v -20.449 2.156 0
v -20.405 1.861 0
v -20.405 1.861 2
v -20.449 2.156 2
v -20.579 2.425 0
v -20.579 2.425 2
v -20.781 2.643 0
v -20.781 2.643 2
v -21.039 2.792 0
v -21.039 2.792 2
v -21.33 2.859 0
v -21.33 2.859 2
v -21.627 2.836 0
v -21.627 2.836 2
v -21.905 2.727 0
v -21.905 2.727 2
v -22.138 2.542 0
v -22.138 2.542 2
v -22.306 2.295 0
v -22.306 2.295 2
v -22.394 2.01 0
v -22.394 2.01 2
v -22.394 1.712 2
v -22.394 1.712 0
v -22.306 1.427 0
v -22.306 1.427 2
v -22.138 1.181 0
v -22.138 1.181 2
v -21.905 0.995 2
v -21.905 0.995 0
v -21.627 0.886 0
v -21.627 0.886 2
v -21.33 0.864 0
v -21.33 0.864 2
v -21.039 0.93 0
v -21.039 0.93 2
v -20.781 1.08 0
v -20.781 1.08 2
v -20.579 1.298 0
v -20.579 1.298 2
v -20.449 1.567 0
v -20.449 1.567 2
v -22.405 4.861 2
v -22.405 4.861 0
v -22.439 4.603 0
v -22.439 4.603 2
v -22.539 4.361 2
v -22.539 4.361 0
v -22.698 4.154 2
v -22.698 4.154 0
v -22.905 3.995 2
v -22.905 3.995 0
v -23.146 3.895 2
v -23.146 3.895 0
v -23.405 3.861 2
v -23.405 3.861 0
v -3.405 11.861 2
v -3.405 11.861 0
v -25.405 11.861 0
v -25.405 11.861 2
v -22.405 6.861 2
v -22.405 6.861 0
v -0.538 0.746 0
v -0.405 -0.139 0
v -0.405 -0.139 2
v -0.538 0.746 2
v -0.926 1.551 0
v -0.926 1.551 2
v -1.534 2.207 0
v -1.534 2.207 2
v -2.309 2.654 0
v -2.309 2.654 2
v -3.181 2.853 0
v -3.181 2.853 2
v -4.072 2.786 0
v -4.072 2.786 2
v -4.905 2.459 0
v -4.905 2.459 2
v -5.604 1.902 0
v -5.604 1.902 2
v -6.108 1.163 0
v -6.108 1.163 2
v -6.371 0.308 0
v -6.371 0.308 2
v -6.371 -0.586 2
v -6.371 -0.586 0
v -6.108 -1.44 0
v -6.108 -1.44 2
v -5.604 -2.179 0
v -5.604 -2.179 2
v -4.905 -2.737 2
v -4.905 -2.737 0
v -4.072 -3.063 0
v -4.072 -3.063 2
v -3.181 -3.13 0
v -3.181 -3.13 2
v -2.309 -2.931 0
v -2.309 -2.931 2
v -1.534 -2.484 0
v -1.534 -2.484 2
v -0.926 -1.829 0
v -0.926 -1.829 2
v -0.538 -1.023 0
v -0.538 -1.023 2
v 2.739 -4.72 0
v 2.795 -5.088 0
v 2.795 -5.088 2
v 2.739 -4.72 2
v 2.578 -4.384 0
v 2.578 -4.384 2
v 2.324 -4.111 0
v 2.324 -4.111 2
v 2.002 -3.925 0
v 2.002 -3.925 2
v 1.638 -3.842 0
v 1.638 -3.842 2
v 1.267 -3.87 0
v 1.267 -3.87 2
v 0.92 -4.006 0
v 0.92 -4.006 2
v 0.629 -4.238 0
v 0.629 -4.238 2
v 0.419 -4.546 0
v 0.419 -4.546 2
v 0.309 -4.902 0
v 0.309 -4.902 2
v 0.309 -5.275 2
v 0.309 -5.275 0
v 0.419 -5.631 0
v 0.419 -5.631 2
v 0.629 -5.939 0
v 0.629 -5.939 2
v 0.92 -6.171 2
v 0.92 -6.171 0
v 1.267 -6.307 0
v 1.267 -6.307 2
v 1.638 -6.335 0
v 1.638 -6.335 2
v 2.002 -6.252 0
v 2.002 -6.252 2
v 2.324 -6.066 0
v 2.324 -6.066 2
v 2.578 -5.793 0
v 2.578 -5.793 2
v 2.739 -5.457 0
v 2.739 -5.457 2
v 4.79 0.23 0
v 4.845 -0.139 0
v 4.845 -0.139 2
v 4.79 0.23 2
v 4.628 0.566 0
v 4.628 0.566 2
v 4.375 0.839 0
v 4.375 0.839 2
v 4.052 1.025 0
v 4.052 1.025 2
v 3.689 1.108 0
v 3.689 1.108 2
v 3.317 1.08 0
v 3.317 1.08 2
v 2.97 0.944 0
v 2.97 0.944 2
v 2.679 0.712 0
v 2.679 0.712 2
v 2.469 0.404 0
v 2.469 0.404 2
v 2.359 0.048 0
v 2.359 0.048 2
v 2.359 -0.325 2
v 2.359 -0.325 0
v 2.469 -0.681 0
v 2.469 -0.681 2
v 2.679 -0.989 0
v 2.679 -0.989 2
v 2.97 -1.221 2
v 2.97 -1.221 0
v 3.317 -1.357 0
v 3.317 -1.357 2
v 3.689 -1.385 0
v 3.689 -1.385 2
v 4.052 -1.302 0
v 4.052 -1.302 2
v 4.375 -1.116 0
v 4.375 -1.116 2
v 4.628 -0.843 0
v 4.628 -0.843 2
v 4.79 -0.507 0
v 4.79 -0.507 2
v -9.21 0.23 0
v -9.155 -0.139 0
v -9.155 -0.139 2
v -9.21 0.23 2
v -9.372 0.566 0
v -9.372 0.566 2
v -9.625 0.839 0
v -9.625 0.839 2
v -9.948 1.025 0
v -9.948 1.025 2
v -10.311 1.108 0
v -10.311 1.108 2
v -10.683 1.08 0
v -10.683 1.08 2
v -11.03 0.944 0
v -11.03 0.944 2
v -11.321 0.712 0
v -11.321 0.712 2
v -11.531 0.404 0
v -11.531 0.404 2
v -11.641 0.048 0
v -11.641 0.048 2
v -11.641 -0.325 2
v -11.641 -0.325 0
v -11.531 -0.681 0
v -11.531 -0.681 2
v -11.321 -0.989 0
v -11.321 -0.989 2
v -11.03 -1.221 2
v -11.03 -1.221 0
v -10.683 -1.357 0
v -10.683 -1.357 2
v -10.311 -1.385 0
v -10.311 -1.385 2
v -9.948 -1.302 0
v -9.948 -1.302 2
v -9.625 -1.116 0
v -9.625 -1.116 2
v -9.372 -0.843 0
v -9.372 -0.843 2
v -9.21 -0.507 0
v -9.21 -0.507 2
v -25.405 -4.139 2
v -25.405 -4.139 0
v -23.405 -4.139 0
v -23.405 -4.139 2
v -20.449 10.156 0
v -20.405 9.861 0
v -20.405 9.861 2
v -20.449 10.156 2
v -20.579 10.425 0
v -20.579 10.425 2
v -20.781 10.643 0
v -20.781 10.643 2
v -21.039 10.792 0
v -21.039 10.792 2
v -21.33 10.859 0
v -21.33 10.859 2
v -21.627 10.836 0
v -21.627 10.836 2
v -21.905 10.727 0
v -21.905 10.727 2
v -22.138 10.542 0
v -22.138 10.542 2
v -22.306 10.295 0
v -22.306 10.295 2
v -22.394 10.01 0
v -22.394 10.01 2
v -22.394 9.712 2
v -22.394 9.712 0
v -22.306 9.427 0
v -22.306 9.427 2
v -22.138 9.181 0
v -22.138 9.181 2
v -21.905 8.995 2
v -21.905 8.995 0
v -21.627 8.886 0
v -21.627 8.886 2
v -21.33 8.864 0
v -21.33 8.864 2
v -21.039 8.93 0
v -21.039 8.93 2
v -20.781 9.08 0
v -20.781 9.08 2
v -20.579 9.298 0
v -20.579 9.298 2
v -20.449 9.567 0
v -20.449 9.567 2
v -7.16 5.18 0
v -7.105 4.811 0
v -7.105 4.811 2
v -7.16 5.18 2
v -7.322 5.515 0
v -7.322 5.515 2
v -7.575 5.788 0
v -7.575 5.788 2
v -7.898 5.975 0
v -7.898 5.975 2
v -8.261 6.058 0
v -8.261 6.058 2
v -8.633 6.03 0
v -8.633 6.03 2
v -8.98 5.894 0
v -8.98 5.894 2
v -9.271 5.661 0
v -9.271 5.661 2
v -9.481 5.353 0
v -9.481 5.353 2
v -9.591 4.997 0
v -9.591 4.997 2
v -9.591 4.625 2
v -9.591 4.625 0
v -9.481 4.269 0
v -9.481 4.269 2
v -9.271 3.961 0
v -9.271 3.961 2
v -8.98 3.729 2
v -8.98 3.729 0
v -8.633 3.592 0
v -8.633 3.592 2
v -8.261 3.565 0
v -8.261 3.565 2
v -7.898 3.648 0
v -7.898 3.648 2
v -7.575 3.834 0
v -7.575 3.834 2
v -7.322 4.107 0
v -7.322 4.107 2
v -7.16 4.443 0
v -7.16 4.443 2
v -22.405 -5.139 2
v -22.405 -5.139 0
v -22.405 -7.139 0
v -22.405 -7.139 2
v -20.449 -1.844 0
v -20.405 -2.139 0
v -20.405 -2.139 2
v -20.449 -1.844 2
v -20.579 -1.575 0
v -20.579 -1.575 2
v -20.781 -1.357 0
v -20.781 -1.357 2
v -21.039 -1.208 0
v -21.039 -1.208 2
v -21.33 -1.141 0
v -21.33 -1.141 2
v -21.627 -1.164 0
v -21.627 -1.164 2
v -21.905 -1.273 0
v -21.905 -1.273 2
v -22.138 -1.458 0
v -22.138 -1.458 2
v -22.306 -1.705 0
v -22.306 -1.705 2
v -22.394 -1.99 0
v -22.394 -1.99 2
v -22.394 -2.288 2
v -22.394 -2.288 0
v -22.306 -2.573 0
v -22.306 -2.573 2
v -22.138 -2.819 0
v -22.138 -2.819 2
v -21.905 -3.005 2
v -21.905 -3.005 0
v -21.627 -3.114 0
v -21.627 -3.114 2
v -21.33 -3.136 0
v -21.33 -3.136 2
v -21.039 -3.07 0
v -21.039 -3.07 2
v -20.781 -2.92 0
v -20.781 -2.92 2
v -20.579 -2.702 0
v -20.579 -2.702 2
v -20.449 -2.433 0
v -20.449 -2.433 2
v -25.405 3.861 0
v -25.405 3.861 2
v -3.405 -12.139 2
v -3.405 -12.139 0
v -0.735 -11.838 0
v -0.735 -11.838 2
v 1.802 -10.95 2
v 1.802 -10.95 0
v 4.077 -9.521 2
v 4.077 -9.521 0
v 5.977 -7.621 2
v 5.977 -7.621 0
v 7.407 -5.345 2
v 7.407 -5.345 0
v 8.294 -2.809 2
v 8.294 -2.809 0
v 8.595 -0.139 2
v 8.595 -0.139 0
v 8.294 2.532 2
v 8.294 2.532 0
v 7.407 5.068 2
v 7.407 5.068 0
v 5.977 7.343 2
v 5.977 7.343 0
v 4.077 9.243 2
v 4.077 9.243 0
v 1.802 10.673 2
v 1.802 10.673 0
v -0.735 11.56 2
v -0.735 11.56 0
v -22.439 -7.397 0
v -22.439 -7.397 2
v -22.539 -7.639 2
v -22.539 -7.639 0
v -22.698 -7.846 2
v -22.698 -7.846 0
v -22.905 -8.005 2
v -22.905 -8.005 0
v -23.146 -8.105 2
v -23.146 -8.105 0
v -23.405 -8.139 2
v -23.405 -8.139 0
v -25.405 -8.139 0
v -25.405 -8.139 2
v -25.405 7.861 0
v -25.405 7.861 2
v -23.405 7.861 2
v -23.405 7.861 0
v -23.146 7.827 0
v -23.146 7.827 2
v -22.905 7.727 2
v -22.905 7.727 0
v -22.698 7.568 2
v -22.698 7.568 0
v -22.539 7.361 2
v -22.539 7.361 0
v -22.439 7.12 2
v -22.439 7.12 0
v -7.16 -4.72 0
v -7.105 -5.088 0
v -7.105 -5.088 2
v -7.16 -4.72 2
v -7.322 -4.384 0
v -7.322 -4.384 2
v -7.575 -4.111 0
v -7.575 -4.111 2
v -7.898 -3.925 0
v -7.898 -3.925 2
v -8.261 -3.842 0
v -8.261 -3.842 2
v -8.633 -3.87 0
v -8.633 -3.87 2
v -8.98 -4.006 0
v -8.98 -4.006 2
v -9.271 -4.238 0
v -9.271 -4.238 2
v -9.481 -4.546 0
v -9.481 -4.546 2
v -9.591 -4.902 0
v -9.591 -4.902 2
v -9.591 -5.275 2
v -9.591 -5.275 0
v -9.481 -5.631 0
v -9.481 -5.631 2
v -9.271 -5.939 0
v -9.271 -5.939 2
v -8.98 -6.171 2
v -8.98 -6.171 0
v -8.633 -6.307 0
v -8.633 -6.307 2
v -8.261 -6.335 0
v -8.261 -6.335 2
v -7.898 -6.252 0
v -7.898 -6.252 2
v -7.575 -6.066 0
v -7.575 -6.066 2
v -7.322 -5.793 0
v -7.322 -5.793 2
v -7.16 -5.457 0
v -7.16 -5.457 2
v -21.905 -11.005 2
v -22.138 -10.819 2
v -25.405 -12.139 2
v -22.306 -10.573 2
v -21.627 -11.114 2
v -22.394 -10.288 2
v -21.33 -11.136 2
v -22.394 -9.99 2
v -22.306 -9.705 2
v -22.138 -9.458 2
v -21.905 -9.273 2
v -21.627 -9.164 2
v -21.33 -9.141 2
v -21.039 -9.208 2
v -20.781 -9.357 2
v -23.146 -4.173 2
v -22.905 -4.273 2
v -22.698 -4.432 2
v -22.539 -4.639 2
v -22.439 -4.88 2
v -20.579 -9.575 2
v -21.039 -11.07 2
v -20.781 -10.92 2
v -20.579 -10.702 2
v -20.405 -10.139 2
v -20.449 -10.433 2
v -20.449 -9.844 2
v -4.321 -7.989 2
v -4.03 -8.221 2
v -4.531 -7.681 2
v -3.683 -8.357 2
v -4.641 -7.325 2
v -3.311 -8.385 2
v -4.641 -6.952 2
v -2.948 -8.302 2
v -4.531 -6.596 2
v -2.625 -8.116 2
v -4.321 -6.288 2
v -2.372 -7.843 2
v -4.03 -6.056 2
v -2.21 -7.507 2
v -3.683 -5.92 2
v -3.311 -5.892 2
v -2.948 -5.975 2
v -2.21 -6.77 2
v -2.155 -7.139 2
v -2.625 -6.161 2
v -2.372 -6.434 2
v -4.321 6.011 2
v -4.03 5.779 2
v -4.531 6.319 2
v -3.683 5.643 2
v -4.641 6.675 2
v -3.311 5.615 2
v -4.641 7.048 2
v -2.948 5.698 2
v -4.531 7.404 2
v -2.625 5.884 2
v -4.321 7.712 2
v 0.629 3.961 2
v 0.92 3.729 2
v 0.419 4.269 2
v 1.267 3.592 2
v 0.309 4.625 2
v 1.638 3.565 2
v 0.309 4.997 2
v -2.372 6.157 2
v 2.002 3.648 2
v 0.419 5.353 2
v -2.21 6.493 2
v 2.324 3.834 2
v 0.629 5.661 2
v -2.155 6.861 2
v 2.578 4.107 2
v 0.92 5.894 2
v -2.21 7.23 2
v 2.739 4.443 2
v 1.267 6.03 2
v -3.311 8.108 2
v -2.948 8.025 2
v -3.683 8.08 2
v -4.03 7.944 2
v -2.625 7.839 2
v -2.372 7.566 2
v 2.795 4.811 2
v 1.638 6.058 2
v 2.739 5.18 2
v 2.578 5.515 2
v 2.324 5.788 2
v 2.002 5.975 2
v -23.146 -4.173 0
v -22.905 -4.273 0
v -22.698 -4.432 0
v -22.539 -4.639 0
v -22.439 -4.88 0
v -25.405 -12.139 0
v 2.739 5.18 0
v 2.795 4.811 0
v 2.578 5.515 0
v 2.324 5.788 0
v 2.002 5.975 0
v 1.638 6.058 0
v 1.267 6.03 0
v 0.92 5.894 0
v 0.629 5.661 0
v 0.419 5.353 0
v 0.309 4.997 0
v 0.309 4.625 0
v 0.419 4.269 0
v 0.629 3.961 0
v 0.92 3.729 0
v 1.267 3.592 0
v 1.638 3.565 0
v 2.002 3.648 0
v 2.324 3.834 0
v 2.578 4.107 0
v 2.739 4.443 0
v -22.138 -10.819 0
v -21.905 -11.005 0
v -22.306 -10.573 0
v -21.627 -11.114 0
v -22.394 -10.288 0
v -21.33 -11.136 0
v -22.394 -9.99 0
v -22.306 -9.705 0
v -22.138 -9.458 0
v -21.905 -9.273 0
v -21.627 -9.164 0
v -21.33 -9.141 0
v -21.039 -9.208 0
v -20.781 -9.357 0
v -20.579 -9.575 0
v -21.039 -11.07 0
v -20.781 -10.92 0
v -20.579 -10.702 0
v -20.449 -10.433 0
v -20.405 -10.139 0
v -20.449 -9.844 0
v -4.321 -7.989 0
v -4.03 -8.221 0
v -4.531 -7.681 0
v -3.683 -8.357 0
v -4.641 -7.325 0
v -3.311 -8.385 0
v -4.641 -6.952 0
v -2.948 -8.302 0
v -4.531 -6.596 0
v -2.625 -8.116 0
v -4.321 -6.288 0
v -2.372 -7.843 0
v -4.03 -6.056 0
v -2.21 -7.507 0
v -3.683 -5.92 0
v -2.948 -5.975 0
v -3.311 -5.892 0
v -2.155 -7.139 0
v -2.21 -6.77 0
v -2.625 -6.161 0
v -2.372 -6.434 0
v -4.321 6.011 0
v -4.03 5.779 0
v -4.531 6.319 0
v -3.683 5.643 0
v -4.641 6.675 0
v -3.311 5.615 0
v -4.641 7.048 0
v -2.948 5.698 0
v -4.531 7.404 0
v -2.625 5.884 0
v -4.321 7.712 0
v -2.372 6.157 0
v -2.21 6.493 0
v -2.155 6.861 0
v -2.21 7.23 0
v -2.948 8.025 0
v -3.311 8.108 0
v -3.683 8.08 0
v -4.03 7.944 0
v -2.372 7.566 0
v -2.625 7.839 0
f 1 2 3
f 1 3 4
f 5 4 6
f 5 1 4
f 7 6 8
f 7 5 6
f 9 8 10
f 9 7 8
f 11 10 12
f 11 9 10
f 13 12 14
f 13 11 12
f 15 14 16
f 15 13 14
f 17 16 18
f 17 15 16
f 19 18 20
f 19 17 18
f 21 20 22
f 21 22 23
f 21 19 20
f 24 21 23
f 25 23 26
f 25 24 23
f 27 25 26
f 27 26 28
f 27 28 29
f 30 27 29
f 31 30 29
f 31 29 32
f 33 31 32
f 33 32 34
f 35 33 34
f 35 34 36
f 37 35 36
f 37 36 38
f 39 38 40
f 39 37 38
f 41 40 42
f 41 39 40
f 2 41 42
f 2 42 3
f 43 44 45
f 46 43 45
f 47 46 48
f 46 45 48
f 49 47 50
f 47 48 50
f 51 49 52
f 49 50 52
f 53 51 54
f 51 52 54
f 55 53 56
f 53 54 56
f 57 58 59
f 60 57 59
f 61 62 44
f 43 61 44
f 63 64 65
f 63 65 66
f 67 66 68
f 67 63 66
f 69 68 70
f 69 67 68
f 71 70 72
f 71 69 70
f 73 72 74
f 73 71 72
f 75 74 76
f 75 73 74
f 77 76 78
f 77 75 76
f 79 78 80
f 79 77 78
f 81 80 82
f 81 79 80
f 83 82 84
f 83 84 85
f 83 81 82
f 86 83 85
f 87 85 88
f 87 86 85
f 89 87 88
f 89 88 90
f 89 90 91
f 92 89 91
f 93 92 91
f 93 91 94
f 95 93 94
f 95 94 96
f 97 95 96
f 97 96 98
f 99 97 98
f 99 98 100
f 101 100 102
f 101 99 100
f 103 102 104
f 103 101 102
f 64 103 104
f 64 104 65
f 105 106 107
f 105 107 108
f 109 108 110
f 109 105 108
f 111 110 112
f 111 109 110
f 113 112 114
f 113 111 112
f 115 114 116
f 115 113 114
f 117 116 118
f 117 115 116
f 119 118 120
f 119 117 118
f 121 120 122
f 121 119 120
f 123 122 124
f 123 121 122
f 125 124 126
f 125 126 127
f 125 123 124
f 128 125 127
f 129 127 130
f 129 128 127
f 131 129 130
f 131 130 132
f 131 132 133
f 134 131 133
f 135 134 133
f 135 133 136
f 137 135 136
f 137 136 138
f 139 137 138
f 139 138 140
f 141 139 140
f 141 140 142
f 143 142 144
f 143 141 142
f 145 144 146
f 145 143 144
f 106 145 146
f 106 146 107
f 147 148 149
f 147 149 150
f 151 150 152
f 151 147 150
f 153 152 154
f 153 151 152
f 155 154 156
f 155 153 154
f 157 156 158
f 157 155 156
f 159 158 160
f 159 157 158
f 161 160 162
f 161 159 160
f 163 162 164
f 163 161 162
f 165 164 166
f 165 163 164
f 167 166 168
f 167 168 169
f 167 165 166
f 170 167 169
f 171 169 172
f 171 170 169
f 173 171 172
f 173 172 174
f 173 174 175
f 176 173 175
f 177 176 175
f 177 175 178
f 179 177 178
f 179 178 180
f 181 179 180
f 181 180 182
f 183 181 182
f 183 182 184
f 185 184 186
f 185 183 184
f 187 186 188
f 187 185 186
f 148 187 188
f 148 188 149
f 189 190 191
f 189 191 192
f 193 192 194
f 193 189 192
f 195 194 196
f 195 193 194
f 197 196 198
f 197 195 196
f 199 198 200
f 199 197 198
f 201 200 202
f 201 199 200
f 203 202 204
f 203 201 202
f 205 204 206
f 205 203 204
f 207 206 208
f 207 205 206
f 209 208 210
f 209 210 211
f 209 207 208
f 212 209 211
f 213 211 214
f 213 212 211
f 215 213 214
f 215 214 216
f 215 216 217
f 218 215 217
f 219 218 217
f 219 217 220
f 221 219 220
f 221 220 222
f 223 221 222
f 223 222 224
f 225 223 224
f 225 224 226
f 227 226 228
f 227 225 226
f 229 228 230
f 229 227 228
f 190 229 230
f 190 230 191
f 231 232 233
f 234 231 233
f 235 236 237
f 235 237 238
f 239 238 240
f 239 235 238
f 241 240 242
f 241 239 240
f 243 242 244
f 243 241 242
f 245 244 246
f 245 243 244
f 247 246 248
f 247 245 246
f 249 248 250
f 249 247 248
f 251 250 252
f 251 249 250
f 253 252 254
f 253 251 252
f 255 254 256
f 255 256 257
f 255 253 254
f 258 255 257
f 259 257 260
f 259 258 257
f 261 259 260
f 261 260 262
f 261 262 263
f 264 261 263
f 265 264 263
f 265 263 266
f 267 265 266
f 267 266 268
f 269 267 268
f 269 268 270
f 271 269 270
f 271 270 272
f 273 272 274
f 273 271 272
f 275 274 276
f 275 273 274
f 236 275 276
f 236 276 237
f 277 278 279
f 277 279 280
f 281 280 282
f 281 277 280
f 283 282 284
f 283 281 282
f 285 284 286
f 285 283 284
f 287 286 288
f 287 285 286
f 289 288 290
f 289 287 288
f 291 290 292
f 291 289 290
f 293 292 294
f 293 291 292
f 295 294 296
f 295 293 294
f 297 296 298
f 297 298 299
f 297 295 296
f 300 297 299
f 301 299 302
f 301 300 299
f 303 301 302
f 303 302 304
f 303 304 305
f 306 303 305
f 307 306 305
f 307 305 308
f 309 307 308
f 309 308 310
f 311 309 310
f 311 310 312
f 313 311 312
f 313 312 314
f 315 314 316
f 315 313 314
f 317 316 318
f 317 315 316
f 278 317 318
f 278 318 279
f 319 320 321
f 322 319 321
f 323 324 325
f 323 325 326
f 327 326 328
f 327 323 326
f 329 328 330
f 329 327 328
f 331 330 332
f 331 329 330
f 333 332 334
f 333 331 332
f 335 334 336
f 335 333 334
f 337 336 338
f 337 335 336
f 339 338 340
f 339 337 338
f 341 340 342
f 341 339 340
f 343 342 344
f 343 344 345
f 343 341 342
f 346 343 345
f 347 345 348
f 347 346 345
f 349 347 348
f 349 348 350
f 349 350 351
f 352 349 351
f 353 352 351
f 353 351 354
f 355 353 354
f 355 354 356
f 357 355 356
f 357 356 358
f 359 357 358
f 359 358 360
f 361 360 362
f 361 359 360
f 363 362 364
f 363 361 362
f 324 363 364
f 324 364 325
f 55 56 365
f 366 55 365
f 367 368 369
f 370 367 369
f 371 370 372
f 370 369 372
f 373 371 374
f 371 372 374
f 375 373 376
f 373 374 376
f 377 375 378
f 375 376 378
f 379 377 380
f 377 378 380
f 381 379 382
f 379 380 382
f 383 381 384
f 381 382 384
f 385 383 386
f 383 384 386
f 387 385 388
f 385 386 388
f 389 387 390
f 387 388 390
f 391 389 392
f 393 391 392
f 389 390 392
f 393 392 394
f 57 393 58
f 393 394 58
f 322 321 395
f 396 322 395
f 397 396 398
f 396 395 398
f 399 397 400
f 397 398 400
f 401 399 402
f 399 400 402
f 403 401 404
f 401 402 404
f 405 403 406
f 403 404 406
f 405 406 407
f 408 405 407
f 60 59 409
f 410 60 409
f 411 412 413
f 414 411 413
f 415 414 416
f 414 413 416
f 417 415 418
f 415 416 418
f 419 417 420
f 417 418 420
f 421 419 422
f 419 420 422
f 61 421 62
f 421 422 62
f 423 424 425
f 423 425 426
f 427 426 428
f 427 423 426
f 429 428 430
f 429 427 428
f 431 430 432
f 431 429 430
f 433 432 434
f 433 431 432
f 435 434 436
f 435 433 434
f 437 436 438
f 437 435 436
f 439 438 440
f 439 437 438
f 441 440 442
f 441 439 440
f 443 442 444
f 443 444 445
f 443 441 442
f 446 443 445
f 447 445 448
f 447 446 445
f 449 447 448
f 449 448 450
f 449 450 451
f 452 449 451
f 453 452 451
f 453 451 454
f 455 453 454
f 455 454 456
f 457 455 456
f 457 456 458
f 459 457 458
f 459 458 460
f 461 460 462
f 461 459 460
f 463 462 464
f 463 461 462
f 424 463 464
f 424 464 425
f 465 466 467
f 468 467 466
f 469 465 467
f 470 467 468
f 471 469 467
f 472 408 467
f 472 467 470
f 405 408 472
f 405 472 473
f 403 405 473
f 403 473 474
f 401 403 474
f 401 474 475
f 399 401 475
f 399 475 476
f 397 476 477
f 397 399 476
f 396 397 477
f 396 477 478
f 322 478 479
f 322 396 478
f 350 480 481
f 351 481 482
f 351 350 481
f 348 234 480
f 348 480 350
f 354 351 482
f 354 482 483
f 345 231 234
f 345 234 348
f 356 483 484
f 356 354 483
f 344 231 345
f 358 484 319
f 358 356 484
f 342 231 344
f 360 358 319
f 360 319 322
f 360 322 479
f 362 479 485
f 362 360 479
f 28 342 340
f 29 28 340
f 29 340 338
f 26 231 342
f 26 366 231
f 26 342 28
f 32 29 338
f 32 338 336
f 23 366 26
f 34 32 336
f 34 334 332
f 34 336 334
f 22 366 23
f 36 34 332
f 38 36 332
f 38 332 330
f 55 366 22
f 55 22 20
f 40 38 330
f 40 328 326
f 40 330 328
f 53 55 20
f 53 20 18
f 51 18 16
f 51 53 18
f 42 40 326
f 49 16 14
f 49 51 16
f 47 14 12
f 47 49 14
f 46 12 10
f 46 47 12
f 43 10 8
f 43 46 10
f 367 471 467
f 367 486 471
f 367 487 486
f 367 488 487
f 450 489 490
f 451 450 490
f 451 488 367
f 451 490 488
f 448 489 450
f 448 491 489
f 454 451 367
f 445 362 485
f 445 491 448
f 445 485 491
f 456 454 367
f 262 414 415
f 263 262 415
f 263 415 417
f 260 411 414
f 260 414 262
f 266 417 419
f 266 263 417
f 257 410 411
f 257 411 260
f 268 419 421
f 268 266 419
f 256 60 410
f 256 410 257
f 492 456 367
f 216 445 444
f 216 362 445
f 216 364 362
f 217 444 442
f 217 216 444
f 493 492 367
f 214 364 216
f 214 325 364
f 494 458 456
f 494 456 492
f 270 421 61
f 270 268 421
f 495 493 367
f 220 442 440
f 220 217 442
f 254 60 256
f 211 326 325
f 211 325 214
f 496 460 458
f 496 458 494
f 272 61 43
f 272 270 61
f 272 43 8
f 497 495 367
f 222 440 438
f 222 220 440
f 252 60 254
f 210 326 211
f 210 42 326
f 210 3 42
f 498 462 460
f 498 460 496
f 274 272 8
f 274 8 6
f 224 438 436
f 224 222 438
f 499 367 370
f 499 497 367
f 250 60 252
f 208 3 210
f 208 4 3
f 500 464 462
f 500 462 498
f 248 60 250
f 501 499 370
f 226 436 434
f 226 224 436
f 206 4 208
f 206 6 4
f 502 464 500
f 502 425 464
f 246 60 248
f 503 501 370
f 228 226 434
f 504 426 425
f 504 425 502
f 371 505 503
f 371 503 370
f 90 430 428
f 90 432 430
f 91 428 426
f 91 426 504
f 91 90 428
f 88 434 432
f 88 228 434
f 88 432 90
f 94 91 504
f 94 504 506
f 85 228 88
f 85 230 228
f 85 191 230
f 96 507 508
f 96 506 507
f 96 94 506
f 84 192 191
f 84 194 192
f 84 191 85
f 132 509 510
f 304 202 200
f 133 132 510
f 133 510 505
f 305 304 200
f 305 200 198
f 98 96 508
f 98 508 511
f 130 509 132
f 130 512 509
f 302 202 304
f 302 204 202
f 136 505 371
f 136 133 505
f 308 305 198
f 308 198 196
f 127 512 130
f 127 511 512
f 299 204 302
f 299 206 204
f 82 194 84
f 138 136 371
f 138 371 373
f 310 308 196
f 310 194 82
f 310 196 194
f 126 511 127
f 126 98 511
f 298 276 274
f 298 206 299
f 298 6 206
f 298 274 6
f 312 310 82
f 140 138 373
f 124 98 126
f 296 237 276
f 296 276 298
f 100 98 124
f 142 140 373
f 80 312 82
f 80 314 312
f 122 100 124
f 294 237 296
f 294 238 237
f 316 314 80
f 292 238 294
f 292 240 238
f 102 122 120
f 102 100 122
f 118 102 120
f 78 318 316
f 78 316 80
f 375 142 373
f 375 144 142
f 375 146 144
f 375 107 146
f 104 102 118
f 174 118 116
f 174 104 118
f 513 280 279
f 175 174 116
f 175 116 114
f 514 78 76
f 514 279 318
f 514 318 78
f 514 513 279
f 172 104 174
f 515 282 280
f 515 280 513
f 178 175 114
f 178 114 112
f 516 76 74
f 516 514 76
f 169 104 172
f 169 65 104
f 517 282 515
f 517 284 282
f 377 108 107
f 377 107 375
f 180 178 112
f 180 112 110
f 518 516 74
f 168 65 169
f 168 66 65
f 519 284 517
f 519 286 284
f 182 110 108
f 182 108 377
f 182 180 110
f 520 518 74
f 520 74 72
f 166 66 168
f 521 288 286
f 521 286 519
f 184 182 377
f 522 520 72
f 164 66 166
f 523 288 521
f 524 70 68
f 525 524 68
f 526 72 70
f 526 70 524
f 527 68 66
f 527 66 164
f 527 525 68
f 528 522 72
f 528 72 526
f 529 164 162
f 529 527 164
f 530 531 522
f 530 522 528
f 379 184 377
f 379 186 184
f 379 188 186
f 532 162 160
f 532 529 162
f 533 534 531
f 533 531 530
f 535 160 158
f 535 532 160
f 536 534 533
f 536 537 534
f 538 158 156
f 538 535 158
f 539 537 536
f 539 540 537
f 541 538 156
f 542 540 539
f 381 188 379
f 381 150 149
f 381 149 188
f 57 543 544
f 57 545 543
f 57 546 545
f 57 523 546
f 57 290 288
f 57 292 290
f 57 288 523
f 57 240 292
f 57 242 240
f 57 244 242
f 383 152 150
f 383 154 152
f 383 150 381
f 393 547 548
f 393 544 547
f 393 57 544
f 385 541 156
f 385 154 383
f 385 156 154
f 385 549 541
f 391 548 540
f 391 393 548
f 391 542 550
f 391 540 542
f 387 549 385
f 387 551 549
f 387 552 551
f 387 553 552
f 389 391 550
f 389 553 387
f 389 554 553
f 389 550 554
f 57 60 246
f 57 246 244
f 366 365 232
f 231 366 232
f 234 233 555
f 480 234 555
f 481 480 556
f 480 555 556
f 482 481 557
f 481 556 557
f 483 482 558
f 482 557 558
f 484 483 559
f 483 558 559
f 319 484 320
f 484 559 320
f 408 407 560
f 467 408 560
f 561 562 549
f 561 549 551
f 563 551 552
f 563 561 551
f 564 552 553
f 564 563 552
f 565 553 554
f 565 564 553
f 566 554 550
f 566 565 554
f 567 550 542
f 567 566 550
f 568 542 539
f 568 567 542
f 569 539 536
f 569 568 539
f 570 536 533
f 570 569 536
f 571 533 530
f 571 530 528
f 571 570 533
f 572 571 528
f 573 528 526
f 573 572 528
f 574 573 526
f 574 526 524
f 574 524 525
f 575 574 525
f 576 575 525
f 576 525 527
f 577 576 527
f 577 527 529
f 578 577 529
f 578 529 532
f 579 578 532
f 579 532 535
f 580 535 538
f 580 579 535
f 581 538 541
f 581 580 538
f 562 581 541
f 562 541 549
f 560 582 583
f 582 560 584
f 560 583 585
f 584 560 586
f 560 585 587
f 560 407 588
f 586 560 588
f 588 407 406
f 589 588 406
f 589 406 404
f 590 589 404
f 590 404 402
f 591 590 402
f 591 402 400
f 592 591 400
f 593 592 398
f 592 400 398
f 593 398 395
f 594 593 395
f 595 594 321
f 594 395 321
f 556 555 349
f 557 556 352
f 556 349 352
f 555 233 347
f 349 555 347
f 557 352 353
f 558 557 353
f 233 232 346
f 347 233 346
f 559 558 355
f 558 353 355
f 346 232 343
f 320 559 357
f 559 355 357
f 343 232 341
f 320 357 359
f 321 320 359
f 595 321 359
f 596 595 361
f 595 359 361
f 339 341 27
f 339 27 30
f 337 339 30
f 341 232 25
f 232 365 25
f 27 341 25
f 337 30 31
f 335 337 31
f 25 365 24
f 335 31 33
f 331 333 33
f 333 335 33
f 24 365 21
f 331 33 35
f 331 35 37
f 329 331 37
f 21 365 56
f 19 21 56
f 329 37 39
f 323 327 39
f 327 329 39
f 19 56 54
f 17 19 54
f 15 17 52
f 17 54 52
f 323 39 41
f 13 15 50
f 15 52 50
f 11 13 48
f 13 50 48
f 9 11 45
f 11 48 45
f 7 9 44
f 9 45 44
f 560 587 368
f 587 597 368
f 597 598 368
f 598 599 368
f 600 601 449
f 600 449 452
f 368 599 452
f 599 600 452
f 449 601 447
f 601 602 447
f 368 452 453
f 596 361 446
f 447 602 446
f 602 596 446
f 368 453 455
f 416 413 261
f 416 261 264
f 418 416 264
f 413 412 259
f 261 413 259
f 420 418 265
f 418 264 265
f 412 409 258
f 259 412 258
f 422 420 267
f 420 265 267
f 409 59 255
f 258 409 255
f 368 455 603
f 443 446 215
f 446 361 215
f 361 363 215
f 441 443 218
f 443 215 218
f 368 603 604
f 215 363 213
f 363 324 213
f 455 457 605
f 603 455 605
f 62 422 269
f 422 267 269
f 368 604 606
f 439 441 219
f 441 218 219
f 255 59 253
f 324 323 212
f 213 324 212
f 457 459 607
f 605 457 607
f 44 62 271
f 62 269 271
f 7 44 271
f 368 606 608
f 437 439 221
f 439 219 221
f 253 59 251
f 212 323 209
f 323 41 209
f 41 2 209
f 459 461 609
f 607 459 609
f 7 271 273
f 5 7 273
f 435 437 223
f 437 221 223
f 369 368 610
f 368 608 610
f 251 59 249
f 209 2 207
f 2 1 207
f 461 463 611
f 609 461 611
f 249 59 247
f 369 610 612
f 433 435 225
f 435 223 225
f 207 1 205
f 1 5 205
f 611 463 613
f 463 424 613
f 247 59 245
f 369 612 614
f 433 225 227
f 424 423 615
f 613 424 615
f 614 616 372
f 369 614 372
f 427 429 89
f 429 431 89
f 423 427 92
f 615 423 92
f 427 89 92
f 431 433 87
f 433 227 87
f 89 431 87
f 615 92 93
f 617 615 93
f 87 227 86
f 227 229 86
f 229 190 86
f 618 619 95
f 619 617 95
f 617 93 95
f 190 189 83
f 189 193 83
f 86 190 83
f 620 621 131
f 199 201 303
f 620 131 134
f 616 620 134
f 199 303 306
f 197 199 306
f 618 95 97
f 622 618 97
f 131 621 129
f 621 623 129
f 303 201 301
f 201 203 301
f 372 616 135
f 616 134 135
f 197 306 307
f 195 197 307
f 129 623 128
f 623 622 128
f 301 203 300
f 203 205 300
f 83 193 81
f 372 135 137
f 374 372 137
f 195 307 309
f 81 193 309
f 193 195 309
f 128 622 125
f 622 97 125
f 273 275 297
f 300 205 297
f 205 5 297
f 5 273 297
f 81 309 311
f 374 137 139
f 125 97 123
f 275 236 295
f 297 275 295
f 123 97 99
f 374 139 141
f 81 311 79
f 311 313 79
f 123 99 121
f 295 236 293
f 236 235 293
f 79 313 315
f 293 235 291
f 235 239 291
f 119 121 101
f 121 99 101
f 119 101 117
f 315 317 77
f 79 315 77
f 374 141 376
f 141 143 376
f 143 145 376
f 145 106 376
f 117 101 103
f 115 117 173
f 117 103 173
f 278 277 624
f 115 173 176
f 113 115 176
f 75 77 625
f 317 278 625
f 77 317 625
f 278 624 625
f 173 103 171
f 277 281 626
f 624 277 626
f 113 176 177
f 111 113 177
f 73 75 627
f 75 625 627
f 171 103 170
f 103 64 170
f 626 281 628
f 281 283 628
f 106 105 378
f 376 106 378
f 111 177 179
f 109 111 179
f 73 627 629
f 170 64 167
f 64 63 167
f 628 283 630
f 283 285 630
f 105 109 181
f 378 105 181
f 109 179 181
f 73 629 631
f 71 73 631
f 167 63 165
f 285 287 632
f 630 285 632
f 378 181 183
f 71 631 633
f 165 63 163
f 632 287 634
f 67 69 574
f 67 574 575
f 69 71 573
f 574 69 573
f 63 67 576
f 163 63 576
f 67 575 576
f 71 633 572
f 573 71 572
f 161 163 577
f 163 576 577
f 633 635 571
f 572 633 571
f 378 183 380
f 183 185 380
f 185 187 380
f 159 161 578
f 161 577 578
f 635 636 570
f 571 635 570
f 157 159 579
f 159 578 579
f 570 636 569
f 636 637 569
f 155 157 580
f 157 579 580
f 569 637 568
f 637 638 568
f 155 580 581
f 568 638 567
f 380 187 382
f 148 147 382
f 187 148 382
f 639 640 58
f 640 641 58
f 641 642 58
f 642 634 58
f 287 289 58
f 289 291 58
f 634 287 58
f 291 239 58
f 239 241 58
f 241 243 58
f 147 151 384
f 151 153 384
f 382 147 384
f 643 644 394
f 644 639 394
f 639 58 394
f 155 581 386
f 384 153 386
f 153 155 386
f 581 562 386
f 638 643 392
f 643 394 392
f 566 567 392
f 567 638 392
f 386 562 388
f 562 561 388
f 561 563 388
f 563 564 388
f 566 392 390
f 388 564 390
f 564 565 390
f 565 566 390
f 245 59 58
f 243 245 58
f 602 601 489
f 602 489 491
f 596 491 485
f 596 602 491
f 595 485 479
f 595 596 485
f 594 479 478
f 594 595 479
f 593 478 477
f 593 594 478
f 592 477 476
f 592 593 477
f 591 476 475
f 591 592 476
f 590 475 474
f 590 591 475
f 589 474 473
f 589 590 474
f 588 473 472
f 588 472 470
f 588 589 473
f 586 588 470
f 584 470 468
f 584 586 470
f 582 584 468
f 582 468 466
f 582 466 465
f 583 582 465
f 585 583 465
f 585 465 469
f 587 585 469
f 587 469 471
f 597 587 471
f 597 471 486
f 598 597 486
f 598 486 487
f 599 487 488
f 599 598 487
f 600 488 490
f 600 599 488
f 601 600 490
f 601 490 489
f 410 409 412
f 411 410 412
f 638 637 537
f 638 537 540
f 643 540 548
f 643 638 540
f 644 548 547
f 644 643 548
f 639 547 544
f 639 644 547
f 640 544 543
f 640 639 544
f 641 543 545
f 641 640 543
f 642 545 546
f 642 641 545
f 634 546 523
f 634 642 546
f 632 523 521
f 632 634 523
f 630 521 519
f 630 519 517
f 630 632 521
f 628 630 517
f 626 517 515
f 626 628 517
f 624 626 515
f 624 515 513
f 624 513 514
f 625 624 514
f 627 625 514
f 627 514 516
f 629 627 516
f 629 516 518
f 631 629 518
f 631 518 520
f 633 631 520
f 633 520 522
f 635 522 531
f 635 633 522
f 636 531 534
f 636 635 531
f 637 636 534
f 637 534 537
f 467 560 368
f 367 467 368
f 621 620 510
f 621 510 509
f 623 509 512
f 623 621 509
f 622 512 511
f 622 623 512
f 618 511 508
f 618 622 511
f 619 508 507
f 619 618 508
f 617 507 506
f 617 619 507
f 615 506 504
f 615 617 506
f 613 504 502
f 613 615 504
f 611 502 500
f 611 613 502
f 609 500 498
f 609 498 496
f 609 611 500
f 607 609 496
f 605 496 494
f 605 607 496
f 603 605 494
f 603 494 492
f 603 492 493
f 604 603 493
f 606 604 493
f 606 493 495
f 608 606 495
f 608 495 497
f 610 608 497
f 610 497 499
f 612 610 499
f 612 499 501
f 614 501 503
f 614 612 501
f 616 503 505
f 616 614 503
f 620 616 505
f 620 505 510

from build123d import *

# Parameters (mm, degrees)
SKETCH_8_R      = 1.25
SKETCH_8_R_2    = 3
SKETCH_8_R_3    = 1
EXTRUDE_1_DEPTH = 2


with BuildPart() as part:
    # 草圖8 → 填料-伸長1 (new body)
    with BuildSketch(Plane.XY):
        with BuildLine():
            Line((-25.40478598, 11.861352689), (-25.40478598, 7.861352689))
            Line((-25.40478598, 7.861352689), (-23.40478598, 7.861352689))
            ThreePointArc((-23.40478598, 7.861352689), (-22.697679198, 7.56845947), (-22.40478598, 6.861352689))
            Line((-22.40478598, 6.861352689), (-22.40478598, 4.861352689))
            ThreePointArc((-22.40478598, 4.861352689), (-22.697679198, 4.154245908), (-23.40478598, 3.861352689))
            Line((-23.40478598, 3.861352689), (-25.40478598, 3.861352689))
            Line((-25.40478598, 3.861352689), (-25.40478598, -4.138647311))
            Line((-25.40478598, -4.138647311), (-23.40478598, -4.138647311))
            ThreePointArc((-23.40478598, -4.138647311), (-22.697679198, -4.43154053), (-22.40478598, -5.138647311))
            Line((-22.40478598, -5.138647311), (-22.40478598, -7.138647311))
            ThreePointArc((-22.40478598, -7.138647311), (-22.697679198, -7.845754092), (-23.40478598, -8.138647311))
            Line((-23.40478598, -8.138647311), (-25.40478598, -8.138647311))
            Line((-25.40478598, -8.138647311), (-25.40478598, -12.138647311))
            Line((-25.40478598, -12.138647311), (-3.40478598, -12.138647311))
            ThreePointArc((-3.40478598, -12.138647311), (8.59521402, -0.138647311), (-3.40478598, 11.861352689))
            Line((-3.40478598, 11.861352689), (-25.40478598, 11.861352689))
        make_face()
        with Locations((-3.40478598, 6.861352689)):
            Circle(SKETCH_8_R, mode=Mode.SUBTRACT)
        with Locations((1.544961489, 4.811100157)):
            Circle(SKETCH_8_R, mode=Mode.SUBTRACT)
        with Locations((-3.40478598, -0.138647311)):
            Circle(SKETCH_8_R_2, mode=Mode.SUBTRACT)
        with Locations((3.59521402, -0.138647311)):
            Circle(SKETCH_8_R, mode=Mode.SUBTRACT)
        with Locations((1.544961489, -5.08839478)):
            Circle(SKETCH_8_R, mode=Mode.SUBTRACT)
        with Locations((-3.40478598, -7.138647311)):
            Circle(SKETCH_8_R, mode=Mode.SUBTRACT)
        with Locations((-8.354533448, -5.08839478)):
            Circle(SKETCH_8_R, mode=Mode.SUBTRACT)
        with Locations((-10.40478598, -0.138647311)):
            Circle(SKETCH_8_R, mode=Mode.SUBTRACT)
        with Locations((-8.354533448, 4.811100157)):
            Circle(SKETCH_8_R, mode=Mode.SUBTRACT)
        with Locations((-21.40478598, 9.861352689)):
            Circle(SKETCH_8_R_3, mode=Mode.SUBTRACT)
        with Locations((-21.40478598, 1.861352689)):
            Circle(SKETCH_8_R_3, mode=Mode.SUBTRACT)
        with Locations((-21.40478598, -2.138647311)):
            Circle(SKETCH_8_R_3, mode=Mode.SUBTRACT)
        with Locations((-21.40478598, -10.138647311)):
            Circle(SKETCH_8_R_3, mode=Mode.SUBTRACT)
    extrude(amount=EXTRUDE_1_DEPTH)


solid = part.part
